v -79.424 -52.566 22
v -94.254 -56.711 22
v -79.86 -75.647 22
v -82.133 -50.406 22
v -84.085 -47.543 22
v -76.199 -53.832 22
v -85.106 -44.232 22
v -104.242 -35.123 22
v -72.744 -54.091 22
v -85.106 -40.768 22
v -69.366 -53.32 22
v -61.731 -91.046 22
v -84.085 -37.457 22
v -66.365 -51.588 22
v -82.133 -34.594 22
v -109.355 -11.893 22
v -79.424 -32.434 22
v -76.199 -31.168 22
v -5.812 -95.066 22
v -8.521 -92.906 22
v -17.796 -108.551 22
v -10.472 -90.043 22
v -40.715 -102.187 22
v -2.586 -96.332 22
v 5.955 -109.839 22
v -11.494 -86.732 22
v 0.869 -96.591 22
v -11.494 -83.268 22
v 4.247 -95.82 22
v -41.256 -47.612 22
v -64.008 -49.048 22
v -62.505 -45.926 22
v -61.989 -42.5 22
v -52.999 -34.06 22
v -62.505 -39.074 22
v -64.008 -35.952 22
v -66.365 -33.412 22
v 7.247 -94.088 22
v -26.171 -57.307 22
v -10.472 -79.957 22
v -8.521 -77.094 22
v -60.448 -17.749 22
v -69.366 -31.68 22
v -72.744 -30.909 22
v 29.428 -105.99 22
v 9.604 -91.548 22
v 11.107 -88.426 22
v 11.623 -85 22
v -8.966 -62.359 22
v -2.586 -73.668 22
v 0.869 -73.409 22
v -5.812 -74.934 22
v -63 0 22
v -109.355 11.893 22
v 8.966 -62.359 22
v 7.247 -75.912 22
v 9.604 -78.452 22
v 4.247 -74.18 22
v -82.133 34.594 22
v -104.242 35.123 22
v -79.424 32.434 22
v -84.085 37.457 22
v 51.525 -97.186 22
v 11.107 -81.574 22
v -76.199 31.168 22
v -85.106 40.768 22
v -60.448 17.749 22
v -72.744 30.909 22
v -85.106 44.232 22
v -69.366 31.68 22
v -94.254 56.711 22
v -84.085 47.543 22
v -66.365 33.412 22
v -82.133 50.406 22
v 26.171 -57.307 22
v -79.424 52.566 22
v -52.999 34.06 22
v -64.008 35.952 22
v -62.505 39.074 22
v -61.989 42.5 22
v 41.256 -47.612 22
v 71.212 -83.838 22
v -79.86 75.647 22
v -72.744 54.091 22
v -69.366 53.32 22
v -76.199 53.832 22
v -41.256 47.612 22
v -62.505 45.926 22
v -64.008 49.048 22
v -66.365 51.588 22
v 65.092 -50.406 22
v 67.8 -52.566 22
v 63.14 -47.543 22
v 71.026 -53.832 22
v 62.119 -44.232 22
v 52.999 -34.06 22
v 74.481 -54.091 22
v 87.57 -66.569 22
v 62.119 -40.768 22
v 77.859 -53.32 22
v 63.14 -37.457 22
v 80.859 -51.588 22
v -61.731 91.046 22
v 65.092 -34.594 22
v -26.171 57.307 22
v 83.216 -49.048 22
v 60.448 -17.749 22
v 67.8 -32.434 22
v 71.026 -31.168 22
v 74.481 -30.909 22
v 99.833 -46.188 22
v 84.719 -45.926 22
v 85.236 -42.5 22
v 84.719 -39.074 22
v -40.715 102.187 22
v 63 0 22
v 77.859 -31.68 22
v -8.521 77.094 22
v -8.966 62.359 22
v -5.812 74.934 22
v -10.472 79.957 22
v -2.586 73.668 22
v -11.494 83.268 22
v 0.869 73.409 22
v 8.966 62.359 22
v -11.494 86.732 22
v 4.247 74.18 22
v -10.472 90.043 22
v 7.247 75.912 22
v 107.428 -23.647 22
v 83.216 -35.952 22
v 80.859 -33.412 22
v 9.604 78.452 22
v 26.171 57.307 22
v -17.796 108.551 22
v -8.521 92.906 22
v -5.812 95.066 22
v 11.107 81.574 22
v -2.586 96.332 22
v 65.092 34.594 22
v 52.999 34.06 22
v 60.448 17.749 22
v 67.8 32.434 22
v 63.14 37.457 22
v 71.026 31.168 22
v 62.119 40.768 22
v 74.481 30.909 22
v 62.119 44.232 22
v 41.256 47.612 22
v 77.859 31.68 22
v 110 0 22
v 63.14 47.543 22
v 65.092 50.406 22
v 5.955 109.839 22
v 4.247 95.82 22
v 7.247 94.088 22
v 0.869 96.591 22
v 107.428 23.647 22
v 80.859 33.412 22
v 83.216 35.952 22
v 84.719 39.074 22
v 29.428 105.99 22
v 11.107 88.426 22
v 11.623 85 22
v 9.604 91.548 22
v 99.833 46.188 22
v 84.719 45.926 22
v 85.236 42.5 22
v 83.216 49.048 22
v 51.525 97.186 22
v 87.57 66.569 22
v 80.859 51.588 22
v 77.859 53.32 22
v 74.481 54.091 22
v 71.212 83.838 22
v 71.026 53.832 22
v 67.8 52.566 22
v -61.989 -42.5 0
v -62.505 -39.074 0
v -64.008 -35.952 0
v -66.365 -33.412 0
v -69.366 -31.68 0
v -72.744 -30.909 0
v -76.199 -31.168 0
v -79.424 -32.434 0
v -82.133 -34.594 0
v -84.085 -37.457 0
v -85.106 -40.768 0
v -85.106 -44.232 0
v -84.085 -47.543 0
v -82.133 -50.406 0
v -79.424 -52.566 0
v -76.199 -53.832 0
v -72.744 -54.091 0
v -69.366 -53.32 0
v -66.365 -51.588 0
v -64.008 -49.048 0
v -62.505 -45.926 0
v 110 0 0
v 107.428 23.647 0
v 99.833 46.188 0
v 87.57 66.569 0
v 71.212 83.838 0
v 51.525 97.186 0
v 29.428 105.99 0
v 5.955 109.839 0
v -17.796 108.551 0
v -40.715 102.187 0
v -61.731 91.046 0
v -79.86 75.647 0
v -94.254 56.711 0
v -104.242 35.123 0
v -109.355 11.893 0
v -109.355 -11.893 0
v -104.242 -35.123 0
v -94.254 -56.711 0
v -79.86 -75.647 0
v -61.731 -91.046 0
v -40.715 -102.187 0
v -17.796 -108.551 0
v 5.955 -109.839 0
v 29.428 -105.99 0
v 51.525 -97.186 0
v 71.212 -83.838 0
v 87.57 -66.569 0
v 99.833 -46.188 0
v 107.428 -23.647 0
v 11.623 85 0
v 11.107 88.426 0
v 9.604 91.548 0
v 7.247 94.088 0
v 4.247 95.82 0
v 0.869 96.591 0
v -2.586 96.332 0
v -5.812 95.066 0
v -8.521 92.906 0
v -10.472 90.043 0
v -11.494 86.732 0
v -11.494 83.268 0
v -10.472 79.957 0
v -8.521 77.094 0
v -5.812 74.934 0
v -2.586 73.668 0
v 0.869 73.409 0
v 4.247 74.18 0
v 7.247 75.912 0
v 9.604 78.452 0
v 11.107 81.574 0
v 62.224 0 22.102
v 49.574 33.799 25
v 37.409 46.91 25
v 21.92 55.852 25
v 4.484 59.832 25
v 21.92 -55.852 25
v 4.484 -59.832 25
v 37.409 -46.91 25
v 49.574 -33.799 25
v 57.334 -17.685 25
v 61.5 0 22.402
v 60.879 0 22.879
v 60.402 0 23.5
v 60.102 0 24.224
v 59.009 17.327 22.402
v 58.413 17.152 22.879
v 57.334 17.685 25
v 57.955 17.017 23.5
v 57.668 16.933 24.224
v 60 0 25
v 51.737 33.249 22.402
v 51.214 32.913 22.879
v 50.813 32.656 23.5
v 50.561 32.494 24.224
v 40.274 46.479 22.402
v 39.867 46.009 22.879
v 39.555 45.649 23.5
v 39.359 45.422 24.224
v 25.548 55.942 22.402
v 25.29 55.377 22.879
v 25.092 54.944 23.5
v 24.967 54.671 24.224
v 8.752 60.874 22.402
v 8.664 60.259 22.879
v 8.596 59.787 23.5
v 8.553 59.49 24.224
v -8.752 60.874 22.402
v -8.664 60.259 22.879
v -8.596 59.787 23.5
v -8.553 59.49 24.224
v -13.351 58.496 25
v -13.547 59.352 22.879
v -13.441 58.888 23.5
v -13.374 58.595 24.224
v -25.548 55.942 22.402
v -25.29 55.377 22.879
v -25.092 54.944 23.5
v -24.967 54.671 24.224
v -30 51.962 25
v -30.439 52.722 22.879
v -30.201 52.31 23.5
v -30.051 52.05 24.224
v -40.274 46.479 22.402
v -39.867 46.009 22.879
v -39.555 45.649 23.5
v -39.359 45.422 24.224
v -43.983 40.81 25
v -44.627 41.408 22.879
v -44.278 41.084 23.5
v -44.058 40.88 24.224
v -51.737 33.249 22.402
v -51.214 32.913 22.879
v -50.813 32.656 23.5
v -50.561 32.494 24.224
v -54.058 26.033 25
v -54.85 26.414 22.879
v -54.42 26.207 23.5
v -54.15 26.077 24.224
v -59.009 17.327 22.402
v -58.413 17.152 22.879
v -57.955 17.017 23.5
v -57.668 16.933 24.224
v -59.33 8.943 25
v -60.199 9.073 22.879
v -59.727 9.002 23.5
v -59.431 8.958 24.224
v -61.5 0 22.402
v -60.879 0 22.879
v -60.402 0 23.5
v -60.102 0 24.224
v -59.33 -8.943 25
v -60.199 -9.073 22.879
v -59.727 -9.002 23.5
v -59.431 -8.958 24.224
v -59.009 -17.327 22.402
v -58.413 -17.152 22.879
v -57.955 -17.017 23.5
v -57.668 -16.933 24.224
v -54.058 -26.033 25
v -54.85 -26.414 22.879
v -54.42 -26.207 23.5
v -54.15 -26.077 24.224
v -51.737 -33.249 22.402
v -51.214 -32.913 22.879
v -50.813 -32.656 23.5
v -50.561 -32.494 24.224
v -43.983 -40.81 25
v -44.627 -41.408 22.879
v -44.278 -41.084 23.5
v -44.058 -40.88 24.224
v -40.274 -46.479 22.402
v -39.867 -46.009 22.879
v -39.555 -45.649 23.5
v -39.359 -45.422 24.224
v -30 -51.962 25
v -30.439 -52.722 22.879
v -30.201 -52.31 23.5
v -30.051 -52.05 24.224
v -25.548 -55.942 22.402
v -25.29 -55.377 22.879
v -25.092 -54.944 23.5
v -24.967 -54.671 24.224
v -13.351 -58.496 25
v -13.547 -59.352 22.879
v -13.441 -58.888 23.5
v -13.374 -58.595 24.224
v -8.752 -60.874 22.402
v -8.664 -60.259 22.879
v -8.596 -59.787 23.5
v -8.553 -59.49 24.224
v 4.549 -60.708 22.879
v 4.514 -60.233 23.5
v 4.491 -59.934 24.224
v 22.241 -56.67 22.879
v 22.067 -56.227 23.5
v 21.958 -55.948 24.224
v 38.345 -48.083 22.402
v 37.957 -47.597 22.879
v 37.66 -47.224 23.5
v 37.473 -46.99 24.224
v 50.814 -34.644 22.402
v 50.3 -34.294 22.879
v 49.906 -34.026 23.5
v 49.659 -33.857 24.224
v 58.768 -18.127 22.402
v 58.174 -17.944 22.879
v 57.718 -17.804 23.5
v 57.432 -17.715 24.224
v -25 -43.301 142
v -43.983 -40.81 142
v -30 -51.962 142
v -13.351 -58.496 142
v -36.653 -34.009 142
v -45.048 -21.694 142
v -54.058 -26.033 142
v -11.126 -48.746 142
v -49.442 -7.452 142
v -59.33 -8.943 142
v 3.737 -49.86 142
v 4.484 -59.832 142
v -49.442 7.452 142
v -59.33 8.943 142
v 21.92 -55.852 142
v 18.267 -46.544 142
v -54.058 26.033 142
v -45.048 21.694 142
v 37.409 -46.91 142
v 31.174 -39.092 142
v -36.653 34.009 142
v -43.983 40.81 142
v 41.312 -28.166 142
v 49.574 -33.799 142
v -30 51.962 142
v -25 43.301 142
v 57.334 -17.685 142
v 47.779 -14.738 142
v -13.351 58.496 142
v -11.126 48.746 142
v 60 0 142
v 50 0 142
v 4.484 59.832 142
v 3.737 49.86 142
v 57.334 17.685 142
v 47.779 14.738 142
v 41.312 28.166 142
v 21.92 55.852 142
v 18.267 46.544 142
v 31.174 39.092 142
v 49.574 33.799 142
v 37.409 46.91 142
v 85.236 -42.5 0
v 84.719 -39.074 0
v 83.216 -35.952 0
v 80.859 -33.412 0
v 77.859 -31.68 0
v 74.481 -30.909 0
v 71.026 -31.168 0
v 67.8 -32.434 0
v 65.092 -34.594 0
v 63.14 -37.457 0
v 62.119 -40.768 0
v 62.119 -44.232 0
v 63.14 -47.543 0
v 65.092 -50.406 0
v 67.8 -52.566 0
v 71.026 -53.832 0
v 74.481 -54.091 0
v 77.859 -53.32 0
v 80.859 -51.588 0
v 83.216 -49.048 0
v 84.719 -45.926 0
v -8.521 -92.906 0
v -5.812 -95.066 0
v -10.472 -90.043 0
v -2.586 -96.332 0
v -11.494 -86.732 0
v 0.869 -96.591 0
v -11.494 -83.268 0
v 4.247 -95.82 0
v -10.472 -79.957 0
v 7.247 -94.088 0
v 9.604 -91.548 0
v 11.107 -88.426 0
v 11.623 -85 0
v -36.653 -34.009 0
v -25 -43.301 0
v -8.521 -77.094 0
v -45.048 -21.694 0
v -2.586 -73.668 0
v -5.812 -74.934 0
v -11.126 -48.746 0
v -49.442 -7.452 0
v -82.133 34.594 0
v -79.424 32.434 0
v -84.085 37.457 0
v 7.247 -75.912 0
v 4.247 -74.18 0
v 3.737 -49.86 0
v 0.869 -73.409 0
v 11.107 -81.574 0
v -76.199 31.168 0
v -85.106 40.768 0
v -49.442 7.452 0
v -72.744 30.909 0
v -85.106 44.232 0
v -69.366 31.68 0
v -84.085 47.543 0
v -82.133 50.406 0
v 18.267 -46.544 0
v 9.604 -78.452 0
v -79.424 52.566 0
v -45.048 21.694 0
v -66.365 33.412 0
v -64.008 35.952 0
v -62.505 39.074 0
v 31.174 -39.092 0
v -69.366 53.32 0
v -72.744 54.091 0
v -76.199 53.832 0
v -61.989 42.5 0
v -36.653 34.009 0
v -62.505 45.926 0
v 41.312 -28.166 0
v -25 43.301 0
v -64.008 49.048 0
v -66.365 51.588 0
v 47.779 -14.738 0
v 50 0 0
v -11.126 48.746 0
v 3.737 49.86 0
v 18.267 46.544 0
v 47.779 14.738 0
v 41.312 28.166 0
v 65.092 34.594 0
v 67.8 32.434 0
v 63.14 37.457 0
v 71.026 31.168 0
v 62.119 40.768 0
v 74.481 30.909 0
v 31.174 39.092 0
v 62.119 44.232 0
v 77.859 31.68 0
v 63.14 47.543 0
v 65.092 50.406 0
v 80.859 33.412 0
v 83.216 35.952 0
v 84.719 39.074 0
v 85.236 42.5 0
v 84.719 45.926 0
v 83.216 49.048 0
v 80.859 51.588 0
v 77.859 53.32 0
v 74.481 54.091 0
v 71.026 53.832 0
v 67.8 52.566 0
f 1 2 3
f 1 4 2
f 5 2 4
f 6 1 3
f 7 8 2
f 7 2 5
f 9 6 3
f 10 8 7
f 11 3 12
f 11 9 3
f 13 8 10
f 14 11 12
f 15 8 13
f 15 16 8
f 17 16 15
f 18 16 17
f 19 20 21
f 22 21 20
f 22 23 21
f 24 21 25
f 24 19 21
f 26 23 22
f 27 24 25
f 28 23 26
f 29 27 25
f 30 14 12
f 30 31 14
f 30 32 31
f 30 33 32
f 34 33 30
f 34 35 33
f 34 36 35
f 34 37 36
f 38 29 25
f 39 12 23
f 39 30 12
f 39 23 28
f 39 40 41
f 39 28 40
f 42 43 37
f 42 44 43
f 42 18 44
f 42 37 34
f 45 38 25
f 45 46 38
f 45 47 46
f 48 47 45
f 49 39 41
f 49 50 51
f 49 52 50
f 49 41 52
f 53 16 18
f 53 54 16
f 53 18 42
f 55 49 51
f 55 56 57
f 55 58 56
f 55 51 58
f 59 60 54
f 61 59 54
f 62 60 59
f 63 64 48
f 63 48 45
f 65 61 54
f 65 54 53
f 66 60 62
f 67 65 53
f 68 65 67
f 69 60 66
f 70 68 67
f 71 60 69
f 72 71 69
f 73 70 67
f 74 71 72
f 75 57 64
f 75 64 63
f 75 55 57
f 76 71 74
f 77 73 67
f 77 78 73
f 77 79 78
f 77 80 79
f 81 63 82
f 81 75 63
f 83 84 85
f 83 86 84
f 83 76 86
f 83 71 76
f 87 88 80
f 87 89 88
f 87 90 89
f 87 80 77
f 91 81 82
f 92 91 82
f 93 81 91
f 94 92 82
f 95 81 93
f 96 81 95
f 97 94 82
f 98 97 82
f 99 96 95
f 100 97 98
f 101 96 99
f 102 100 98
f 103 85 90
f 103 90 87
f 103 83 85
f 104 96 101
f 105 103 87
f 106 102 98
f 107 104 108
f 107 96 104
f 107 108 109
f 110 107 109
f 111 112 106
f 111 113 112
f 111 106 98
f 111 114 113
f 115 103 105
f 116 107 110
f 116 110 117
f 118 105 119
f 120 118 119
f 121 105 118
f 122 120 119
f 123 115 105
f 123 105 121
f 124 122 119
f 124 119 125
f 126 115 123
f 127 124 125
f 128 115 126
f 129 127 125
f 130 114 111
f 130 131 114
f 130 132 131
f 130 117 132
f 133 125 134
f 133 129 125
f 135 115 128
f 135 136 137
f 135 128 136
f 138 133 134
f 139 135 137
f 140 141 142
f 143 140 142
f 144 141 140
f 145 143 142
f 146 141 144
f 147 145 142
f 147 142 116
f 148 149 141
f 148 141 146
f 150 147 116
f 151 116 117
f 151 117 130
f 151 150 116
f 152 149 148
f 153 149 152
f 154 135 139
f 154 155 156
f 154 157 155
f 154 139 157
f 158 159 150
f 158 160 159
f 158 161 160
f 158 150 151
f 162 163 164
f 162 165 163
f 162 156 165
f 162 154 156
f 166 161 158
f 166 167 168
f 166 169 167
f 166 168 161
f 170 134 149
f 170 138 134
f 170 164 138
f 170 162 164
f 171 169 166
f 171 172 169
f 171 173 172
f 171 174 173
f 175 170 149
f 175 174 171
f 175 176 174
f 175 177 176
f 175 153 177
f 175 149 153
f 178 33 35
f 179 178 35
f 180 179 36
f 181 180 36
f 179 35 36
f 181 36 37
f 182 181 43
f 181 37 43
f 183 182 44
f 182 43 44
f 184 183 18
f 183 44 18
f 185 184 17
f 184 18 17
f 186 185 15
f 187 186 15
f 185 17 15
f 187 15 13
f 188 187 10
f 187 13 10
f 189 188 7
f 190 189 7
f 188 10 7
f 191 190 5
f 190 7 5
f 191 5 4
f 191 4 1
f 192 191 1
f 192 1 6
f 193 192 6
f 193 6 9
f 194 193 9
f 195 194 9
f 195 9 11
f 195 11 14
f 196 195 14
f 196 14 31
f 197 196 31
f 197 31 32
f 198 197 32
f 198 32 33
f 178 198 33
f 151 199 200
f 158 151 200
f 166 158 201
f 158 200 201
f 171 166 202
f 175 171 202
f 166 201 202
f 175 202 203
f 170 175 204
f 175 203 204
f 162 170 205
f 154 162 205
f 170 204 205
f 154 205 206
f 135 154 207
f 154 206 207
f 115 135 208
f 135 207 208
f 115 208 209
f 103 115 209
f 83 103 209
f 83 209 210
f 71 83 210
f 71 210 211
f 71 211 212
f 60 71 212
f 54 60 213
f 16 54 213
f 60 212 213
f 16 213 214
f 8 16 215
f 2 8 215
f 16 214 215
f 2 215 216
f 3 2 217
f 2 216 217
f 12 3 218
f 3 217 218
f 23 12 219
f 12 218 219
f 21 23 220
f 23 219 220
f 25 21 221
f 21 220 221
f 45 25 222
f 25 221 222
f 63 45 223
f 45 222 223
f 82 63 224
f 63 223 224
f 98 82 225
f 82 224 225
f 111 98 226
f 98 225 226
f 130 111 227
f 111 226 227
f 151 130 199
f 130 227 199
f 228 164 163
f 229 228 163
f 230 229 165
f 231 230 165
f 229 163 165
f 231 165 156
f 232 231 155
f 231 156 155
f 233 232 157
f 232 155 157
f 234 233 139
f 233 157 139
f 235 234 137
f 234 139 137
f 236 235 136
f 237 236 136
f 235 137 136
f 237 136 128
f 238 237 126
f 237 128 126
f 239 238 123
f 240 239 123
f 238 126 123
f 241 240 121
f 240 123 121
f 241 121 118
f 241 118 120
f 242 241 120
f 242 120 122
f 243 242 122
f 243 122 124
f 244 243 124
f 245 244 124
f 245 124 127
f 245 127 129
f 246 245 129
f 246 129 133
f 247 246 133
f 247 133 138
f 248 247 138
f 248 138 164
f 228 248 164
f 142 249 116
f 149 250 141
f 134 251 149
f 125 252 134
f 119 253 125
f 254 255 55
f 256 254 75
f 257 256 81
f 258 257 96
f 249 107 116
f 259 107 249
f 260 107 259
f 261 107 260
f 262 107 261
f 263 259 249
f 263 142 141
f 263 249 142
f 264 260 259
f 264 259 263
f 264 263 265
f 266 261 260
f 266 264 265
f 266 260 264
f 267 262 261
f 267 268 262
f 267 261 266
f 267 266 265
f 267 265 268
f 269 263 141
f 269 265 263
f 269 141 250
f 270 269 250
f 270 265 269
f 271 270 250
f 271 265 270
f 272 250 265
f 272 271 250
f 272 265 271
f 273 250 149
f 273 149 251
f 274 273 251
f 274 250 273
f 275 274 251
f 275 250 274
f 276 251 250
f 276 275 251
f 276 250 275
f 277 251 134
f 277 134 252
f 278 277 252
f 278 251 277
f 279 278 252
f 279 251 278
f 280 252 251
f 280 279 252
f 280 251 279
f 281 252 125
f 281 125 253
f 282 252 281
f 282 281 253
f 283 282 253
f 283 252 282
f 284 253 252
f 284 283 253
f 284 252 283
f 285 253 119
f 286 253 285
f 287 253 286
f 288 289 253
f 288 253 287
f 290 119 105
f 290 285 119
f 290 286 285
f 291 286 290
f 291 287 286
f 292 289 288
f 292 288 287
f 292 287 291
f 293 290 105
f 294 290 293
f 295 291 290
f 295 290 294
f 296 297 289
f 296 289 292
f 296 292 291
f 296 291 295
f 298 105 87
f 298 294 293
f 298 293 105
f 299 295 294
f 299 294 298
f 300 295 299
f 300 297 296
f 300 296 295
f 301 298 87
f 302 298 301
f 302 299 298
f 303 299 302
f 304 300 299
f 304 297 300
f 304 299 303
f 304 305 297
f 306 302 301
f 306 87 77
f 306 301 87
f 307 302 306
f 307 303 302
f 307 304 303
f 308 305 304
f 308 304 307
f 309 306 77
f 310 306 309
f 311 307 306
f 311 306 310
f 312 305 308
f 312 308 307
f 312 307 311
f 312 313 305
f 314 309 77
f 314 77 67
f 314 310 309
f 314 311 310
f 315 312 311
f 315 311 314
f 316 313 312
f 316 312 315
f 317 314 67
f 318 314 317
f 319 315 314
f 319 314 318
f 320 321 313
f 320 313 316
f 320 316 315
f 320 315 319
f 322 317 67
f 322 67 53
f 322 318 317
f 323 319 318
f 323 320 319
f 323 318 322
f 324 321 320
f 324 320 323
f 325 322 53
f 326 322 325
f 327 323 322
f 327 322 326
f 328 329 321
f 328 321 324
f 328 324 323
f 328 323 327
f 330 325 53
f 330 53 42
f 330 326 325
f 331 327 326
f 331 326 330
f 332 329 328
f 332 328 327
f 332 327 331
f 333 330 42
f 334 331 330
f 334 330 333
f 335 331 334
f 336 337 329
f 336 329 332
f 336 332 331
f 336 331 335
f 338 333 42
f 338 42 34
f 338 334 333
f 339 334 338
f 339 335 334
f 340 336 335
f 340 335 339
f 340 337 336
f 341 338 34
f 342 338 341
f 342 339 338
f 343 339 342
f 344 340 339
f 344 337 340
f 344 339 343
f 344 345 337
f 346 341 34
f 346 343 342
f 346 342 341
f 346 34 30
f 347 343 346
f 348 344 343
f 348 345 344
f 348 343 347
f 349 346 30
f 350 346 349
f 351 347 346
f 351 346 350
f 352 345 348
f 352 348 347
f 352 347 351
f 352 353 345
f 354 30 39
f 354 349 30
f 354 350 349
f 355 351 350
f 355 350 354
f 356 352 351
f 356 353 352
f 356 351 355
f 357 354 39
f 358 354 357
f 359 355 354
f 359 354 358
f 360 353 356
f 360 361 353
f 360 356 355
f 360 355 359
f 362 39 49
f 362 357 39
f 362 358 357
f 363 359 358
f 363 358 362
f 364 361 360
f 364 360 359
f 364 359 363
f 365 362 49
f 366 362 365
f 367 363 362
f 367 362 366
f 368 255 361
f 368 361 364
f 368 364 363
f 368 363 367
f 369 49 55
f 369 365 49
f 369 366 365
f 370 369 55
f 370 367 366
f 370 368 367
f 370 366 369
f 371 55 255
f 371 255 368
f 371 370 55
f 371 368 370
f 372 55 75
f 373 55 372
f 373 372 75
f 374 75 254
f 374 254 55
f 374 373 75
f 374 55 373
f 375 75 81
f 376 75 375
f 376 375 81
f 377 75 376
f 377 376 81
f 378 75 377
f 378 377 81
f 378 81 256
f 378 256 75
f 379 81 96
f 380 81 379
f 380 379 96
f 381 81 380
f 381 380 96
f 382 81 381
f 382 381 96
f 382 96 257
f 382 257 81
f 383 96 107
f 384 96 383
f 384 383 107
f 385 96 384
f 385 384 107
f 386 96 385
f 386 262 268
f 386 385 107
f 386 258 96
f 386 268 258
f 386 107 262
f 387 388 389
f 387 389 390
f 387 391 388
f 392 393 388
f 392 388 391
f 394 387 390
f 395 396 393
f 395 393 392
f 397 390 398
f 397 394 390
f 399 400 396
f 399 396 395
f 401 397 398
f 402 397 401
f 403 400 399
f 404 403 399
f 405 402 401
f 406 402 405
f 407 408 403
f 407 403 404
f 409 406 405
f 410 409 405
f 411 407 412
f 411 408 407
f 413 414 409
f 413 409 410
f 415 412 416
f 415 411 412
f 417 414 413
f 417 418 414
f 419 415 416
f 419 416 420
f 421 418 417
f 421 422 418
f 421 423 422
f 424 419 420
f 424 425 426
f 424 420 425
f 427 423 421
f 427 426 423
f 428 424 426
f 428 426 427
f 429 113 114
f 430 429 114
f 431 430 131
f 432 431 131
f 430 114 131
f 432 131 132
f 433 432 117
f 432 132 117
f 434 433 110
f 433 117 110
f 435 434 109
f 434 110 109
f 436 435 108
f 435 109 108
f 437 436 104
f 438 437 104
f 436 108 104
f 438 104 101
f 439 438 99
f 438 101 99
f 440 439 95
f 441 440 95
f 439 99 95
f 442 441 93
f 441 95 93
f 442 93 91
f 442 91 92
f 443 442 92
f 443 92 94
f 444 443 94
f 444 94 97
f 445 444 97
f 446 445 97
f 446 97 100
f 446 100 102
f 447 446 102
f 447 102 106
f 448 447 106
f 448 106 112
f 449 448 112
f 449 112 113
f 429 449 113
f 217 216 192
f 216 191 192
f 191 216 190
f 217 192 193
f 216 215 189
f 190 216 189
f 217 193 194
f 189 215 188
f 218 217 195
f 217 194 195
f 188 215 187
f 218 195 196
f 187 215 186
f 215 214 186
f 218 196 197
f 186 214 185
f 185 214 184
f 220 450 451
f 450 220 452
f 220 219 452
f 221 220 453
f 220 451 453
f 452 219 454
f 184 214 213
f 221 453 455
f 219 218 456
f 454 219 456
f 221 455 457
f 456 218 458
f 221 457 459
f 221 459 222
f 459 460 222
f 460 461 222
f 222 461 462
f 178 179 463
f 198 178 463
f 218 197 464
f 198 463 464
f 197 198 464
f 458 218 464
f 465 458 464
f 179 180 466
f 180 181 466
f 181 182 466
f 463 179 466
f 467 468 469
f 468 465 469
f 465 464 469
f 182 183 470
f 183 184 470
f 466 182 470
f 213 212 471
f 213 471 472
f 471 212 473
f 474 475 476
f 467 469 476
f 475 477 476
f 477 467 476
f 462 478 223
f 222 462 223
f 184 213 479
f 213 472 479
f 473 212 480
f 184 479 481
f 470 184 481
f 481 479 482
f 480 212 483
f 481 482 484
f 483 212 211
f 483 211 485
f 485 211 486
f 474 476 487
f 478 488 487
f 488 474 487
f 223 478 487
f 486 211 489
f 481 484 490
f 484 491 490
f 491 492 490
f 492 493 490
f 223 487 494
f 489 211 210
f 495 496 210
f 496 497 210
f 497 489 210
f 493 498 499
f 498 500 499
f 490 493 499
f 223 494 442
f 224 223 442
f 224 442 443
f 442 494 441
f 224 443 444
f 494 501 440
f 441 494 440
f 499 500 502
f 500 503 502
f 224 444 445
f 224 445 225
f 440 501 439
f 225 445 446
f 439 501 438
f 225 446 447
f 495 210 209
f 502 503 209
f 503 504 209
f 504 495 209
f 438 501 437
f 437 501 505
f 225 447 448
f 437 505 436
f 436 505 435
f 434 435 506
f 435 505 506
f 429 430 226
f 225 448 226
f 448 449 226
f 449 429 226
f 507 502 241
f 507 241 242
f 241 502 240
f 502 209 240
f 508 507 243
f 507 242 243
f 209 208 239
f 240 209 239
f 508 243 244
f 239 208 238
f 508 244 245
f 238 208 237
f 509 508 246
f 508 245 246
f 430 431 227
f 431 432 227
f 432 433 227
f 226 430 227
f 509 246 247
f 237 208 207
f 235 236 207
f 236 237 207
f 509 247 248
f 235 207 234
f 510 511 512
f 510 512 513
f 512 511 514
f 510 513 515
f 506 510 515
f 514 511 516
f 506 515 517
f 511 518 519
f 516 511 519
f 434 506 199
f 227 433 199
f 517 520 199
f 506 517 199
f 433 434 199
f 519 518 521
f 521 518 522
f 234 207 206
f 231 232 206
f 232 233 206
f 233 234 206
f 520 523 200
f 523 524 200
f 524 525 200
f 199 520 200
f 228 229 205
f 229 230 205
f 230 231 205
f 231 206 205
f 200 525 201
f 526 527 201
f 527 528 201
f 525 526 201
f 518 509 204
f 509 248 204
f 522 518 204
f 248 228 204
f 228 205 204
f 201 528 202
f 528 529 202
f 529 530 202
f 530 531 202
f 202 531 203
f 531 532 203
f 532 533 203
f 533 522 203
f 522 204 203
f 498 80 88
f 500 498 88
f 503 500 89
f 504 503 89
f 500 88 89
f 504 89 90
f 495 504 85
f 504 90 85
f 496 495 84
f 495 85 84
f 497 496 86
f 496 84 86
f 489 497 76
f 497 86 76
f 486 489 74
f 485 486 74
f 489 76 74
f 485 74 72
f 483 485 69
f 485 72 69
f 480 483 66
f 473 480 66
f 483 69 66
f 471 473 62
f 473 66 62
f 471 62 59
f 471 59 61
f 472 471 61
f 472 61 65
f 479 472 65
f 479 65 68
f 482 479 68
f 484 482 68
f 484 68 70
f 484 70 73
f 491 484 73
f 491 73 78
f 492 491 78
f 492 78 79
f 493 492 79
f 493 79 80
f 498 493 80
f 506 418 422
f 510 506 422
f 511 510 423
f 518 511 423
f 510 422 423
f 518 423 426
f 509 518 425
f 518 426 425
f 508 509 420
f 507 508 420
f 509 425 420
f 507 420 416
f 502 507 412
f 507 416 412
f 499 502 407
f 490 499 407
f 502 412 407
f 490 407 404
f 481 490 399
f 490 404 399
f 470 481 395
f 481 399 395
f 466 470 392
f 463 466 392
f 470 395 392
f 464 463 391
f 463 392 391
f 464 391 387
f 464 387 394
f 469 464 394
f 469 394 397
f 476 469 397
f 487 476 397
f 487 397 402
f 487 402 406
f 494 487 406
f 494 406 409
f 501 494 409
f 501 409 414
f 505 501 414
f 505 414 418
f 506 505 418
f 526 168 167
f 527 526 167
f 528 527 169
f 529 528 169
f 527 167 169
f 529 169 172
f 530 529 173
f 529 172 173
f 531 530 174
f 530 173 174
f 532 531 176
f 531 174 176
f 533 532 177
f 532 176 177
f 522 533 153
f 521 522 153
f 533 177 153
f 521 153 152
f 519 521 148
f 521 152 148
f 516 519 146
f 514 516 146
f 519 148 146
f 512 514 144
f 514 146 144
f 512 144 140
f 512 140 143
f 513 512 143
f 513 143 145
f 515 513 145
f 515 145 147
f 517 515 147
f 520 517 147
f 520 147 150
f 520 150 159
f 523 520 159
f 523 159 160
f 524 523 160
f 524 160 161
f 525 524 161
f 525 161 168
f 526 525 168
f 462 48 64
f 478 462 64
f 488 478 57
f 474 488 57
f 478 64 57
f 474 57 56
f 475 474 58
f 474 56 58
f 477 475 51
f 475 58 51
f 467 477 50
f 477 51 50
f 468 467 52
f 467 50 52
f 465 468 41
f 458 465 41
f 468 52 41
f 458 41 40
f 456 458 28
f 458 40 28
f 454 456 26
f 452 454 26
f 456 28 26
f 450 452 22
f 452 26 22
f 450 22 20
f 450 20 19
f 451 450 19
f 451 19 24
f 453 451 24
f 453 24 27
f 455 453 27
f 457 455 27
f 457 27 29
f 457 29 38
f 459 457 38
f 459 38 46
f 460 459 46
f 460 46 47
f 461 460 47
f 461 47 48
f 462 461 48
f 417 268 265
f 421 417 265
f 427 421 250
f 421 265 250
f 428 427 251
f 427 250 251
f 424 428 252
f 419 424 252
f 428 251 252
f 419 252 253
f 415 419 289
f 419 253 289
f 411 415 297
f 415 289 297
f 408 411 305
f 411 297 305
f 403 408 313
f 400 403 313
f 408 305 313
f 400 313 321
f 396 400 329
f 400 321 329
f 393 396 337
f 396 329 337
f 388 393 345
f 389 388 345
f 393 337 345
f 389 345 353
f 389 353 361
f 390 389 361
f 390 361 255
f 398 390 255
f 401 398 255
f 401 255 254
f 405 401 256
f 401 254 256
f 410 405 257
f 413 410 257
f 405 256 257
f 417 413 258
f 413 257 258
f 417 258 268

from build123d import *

# Parameters (mm, degrees)
SKETCH1_R           = 110
BOSS_EXTRUDE1_DEPTH = 22
SKETCH2_R           = 60
BOSS_EXTRUDE2_DEPTH = 120
SKETCH3_R           = 50
CUT_EXTRUDE1_DEPTH  = 211.627633515
SKETCH4_R           = 11.623448081
CUT_EXTRUDE2_DEPTH  = 197.468827044
FILLET1_R           = 3


with BuildPart() as part:
    # Sketch1 → Boss-Extrude1 (new body)
    with BuildSketch(Plane.XY):
        Circle(SKETCH1_R)
    extrude(amount=BOSS_EXTRUDE1_DEPTH)

    # Sketch2 → Boss-Extrude2 (add)
    with BuildSketch(Plane.XY.offset(22)):
        Circle(SKETCH2_R)
    extrude(amount=BOSS_EXTRUDE2_DEPTH)

    # Sketch3 → Cut-Extrude1 (cut, through all)
    with BuildSketch(Plane.XY.offset(142)):
        Circle(SKETCH3_R)
    extrude(amount=-CUT_EXTRUDE1_DEPTH, mode=Mode.SUBTRACT)

    # Sketch4 → Cut-Extrude2 (cut, through all)
    with BuildSketch(Plane.XY.offset(22)):
        with Locations((0, 85)):
            Circle(SKETCH4_R)
        with Locations((73.612159322, 42.5)):
            Circle(SKETCH4_R)
        with Locations((73.612159322, -42.5)):
            Circle(SKETCH4_R)
        with Locations((0, -85)):
            Circle(SKETCH4_R)
        with Locations((-73.612159322, -42.5)):
            Circle(SKETCH4_R)
        with Locations((-73.612159322, 42.5)):
            Circle(SKETCH4_R)
    extrude(amount=-CUT_EXTRUDE2_DEPTH, mode=Mode.SUBTRACT)

    # Fillet1
    fillet1_edges = [part.edges().sort_by_distance(p)[0] for p in [
        (-60, 0, 22),
    ]]
    fillet(fillet1_edges, radius=FILLET1_R)


solid = part.part
